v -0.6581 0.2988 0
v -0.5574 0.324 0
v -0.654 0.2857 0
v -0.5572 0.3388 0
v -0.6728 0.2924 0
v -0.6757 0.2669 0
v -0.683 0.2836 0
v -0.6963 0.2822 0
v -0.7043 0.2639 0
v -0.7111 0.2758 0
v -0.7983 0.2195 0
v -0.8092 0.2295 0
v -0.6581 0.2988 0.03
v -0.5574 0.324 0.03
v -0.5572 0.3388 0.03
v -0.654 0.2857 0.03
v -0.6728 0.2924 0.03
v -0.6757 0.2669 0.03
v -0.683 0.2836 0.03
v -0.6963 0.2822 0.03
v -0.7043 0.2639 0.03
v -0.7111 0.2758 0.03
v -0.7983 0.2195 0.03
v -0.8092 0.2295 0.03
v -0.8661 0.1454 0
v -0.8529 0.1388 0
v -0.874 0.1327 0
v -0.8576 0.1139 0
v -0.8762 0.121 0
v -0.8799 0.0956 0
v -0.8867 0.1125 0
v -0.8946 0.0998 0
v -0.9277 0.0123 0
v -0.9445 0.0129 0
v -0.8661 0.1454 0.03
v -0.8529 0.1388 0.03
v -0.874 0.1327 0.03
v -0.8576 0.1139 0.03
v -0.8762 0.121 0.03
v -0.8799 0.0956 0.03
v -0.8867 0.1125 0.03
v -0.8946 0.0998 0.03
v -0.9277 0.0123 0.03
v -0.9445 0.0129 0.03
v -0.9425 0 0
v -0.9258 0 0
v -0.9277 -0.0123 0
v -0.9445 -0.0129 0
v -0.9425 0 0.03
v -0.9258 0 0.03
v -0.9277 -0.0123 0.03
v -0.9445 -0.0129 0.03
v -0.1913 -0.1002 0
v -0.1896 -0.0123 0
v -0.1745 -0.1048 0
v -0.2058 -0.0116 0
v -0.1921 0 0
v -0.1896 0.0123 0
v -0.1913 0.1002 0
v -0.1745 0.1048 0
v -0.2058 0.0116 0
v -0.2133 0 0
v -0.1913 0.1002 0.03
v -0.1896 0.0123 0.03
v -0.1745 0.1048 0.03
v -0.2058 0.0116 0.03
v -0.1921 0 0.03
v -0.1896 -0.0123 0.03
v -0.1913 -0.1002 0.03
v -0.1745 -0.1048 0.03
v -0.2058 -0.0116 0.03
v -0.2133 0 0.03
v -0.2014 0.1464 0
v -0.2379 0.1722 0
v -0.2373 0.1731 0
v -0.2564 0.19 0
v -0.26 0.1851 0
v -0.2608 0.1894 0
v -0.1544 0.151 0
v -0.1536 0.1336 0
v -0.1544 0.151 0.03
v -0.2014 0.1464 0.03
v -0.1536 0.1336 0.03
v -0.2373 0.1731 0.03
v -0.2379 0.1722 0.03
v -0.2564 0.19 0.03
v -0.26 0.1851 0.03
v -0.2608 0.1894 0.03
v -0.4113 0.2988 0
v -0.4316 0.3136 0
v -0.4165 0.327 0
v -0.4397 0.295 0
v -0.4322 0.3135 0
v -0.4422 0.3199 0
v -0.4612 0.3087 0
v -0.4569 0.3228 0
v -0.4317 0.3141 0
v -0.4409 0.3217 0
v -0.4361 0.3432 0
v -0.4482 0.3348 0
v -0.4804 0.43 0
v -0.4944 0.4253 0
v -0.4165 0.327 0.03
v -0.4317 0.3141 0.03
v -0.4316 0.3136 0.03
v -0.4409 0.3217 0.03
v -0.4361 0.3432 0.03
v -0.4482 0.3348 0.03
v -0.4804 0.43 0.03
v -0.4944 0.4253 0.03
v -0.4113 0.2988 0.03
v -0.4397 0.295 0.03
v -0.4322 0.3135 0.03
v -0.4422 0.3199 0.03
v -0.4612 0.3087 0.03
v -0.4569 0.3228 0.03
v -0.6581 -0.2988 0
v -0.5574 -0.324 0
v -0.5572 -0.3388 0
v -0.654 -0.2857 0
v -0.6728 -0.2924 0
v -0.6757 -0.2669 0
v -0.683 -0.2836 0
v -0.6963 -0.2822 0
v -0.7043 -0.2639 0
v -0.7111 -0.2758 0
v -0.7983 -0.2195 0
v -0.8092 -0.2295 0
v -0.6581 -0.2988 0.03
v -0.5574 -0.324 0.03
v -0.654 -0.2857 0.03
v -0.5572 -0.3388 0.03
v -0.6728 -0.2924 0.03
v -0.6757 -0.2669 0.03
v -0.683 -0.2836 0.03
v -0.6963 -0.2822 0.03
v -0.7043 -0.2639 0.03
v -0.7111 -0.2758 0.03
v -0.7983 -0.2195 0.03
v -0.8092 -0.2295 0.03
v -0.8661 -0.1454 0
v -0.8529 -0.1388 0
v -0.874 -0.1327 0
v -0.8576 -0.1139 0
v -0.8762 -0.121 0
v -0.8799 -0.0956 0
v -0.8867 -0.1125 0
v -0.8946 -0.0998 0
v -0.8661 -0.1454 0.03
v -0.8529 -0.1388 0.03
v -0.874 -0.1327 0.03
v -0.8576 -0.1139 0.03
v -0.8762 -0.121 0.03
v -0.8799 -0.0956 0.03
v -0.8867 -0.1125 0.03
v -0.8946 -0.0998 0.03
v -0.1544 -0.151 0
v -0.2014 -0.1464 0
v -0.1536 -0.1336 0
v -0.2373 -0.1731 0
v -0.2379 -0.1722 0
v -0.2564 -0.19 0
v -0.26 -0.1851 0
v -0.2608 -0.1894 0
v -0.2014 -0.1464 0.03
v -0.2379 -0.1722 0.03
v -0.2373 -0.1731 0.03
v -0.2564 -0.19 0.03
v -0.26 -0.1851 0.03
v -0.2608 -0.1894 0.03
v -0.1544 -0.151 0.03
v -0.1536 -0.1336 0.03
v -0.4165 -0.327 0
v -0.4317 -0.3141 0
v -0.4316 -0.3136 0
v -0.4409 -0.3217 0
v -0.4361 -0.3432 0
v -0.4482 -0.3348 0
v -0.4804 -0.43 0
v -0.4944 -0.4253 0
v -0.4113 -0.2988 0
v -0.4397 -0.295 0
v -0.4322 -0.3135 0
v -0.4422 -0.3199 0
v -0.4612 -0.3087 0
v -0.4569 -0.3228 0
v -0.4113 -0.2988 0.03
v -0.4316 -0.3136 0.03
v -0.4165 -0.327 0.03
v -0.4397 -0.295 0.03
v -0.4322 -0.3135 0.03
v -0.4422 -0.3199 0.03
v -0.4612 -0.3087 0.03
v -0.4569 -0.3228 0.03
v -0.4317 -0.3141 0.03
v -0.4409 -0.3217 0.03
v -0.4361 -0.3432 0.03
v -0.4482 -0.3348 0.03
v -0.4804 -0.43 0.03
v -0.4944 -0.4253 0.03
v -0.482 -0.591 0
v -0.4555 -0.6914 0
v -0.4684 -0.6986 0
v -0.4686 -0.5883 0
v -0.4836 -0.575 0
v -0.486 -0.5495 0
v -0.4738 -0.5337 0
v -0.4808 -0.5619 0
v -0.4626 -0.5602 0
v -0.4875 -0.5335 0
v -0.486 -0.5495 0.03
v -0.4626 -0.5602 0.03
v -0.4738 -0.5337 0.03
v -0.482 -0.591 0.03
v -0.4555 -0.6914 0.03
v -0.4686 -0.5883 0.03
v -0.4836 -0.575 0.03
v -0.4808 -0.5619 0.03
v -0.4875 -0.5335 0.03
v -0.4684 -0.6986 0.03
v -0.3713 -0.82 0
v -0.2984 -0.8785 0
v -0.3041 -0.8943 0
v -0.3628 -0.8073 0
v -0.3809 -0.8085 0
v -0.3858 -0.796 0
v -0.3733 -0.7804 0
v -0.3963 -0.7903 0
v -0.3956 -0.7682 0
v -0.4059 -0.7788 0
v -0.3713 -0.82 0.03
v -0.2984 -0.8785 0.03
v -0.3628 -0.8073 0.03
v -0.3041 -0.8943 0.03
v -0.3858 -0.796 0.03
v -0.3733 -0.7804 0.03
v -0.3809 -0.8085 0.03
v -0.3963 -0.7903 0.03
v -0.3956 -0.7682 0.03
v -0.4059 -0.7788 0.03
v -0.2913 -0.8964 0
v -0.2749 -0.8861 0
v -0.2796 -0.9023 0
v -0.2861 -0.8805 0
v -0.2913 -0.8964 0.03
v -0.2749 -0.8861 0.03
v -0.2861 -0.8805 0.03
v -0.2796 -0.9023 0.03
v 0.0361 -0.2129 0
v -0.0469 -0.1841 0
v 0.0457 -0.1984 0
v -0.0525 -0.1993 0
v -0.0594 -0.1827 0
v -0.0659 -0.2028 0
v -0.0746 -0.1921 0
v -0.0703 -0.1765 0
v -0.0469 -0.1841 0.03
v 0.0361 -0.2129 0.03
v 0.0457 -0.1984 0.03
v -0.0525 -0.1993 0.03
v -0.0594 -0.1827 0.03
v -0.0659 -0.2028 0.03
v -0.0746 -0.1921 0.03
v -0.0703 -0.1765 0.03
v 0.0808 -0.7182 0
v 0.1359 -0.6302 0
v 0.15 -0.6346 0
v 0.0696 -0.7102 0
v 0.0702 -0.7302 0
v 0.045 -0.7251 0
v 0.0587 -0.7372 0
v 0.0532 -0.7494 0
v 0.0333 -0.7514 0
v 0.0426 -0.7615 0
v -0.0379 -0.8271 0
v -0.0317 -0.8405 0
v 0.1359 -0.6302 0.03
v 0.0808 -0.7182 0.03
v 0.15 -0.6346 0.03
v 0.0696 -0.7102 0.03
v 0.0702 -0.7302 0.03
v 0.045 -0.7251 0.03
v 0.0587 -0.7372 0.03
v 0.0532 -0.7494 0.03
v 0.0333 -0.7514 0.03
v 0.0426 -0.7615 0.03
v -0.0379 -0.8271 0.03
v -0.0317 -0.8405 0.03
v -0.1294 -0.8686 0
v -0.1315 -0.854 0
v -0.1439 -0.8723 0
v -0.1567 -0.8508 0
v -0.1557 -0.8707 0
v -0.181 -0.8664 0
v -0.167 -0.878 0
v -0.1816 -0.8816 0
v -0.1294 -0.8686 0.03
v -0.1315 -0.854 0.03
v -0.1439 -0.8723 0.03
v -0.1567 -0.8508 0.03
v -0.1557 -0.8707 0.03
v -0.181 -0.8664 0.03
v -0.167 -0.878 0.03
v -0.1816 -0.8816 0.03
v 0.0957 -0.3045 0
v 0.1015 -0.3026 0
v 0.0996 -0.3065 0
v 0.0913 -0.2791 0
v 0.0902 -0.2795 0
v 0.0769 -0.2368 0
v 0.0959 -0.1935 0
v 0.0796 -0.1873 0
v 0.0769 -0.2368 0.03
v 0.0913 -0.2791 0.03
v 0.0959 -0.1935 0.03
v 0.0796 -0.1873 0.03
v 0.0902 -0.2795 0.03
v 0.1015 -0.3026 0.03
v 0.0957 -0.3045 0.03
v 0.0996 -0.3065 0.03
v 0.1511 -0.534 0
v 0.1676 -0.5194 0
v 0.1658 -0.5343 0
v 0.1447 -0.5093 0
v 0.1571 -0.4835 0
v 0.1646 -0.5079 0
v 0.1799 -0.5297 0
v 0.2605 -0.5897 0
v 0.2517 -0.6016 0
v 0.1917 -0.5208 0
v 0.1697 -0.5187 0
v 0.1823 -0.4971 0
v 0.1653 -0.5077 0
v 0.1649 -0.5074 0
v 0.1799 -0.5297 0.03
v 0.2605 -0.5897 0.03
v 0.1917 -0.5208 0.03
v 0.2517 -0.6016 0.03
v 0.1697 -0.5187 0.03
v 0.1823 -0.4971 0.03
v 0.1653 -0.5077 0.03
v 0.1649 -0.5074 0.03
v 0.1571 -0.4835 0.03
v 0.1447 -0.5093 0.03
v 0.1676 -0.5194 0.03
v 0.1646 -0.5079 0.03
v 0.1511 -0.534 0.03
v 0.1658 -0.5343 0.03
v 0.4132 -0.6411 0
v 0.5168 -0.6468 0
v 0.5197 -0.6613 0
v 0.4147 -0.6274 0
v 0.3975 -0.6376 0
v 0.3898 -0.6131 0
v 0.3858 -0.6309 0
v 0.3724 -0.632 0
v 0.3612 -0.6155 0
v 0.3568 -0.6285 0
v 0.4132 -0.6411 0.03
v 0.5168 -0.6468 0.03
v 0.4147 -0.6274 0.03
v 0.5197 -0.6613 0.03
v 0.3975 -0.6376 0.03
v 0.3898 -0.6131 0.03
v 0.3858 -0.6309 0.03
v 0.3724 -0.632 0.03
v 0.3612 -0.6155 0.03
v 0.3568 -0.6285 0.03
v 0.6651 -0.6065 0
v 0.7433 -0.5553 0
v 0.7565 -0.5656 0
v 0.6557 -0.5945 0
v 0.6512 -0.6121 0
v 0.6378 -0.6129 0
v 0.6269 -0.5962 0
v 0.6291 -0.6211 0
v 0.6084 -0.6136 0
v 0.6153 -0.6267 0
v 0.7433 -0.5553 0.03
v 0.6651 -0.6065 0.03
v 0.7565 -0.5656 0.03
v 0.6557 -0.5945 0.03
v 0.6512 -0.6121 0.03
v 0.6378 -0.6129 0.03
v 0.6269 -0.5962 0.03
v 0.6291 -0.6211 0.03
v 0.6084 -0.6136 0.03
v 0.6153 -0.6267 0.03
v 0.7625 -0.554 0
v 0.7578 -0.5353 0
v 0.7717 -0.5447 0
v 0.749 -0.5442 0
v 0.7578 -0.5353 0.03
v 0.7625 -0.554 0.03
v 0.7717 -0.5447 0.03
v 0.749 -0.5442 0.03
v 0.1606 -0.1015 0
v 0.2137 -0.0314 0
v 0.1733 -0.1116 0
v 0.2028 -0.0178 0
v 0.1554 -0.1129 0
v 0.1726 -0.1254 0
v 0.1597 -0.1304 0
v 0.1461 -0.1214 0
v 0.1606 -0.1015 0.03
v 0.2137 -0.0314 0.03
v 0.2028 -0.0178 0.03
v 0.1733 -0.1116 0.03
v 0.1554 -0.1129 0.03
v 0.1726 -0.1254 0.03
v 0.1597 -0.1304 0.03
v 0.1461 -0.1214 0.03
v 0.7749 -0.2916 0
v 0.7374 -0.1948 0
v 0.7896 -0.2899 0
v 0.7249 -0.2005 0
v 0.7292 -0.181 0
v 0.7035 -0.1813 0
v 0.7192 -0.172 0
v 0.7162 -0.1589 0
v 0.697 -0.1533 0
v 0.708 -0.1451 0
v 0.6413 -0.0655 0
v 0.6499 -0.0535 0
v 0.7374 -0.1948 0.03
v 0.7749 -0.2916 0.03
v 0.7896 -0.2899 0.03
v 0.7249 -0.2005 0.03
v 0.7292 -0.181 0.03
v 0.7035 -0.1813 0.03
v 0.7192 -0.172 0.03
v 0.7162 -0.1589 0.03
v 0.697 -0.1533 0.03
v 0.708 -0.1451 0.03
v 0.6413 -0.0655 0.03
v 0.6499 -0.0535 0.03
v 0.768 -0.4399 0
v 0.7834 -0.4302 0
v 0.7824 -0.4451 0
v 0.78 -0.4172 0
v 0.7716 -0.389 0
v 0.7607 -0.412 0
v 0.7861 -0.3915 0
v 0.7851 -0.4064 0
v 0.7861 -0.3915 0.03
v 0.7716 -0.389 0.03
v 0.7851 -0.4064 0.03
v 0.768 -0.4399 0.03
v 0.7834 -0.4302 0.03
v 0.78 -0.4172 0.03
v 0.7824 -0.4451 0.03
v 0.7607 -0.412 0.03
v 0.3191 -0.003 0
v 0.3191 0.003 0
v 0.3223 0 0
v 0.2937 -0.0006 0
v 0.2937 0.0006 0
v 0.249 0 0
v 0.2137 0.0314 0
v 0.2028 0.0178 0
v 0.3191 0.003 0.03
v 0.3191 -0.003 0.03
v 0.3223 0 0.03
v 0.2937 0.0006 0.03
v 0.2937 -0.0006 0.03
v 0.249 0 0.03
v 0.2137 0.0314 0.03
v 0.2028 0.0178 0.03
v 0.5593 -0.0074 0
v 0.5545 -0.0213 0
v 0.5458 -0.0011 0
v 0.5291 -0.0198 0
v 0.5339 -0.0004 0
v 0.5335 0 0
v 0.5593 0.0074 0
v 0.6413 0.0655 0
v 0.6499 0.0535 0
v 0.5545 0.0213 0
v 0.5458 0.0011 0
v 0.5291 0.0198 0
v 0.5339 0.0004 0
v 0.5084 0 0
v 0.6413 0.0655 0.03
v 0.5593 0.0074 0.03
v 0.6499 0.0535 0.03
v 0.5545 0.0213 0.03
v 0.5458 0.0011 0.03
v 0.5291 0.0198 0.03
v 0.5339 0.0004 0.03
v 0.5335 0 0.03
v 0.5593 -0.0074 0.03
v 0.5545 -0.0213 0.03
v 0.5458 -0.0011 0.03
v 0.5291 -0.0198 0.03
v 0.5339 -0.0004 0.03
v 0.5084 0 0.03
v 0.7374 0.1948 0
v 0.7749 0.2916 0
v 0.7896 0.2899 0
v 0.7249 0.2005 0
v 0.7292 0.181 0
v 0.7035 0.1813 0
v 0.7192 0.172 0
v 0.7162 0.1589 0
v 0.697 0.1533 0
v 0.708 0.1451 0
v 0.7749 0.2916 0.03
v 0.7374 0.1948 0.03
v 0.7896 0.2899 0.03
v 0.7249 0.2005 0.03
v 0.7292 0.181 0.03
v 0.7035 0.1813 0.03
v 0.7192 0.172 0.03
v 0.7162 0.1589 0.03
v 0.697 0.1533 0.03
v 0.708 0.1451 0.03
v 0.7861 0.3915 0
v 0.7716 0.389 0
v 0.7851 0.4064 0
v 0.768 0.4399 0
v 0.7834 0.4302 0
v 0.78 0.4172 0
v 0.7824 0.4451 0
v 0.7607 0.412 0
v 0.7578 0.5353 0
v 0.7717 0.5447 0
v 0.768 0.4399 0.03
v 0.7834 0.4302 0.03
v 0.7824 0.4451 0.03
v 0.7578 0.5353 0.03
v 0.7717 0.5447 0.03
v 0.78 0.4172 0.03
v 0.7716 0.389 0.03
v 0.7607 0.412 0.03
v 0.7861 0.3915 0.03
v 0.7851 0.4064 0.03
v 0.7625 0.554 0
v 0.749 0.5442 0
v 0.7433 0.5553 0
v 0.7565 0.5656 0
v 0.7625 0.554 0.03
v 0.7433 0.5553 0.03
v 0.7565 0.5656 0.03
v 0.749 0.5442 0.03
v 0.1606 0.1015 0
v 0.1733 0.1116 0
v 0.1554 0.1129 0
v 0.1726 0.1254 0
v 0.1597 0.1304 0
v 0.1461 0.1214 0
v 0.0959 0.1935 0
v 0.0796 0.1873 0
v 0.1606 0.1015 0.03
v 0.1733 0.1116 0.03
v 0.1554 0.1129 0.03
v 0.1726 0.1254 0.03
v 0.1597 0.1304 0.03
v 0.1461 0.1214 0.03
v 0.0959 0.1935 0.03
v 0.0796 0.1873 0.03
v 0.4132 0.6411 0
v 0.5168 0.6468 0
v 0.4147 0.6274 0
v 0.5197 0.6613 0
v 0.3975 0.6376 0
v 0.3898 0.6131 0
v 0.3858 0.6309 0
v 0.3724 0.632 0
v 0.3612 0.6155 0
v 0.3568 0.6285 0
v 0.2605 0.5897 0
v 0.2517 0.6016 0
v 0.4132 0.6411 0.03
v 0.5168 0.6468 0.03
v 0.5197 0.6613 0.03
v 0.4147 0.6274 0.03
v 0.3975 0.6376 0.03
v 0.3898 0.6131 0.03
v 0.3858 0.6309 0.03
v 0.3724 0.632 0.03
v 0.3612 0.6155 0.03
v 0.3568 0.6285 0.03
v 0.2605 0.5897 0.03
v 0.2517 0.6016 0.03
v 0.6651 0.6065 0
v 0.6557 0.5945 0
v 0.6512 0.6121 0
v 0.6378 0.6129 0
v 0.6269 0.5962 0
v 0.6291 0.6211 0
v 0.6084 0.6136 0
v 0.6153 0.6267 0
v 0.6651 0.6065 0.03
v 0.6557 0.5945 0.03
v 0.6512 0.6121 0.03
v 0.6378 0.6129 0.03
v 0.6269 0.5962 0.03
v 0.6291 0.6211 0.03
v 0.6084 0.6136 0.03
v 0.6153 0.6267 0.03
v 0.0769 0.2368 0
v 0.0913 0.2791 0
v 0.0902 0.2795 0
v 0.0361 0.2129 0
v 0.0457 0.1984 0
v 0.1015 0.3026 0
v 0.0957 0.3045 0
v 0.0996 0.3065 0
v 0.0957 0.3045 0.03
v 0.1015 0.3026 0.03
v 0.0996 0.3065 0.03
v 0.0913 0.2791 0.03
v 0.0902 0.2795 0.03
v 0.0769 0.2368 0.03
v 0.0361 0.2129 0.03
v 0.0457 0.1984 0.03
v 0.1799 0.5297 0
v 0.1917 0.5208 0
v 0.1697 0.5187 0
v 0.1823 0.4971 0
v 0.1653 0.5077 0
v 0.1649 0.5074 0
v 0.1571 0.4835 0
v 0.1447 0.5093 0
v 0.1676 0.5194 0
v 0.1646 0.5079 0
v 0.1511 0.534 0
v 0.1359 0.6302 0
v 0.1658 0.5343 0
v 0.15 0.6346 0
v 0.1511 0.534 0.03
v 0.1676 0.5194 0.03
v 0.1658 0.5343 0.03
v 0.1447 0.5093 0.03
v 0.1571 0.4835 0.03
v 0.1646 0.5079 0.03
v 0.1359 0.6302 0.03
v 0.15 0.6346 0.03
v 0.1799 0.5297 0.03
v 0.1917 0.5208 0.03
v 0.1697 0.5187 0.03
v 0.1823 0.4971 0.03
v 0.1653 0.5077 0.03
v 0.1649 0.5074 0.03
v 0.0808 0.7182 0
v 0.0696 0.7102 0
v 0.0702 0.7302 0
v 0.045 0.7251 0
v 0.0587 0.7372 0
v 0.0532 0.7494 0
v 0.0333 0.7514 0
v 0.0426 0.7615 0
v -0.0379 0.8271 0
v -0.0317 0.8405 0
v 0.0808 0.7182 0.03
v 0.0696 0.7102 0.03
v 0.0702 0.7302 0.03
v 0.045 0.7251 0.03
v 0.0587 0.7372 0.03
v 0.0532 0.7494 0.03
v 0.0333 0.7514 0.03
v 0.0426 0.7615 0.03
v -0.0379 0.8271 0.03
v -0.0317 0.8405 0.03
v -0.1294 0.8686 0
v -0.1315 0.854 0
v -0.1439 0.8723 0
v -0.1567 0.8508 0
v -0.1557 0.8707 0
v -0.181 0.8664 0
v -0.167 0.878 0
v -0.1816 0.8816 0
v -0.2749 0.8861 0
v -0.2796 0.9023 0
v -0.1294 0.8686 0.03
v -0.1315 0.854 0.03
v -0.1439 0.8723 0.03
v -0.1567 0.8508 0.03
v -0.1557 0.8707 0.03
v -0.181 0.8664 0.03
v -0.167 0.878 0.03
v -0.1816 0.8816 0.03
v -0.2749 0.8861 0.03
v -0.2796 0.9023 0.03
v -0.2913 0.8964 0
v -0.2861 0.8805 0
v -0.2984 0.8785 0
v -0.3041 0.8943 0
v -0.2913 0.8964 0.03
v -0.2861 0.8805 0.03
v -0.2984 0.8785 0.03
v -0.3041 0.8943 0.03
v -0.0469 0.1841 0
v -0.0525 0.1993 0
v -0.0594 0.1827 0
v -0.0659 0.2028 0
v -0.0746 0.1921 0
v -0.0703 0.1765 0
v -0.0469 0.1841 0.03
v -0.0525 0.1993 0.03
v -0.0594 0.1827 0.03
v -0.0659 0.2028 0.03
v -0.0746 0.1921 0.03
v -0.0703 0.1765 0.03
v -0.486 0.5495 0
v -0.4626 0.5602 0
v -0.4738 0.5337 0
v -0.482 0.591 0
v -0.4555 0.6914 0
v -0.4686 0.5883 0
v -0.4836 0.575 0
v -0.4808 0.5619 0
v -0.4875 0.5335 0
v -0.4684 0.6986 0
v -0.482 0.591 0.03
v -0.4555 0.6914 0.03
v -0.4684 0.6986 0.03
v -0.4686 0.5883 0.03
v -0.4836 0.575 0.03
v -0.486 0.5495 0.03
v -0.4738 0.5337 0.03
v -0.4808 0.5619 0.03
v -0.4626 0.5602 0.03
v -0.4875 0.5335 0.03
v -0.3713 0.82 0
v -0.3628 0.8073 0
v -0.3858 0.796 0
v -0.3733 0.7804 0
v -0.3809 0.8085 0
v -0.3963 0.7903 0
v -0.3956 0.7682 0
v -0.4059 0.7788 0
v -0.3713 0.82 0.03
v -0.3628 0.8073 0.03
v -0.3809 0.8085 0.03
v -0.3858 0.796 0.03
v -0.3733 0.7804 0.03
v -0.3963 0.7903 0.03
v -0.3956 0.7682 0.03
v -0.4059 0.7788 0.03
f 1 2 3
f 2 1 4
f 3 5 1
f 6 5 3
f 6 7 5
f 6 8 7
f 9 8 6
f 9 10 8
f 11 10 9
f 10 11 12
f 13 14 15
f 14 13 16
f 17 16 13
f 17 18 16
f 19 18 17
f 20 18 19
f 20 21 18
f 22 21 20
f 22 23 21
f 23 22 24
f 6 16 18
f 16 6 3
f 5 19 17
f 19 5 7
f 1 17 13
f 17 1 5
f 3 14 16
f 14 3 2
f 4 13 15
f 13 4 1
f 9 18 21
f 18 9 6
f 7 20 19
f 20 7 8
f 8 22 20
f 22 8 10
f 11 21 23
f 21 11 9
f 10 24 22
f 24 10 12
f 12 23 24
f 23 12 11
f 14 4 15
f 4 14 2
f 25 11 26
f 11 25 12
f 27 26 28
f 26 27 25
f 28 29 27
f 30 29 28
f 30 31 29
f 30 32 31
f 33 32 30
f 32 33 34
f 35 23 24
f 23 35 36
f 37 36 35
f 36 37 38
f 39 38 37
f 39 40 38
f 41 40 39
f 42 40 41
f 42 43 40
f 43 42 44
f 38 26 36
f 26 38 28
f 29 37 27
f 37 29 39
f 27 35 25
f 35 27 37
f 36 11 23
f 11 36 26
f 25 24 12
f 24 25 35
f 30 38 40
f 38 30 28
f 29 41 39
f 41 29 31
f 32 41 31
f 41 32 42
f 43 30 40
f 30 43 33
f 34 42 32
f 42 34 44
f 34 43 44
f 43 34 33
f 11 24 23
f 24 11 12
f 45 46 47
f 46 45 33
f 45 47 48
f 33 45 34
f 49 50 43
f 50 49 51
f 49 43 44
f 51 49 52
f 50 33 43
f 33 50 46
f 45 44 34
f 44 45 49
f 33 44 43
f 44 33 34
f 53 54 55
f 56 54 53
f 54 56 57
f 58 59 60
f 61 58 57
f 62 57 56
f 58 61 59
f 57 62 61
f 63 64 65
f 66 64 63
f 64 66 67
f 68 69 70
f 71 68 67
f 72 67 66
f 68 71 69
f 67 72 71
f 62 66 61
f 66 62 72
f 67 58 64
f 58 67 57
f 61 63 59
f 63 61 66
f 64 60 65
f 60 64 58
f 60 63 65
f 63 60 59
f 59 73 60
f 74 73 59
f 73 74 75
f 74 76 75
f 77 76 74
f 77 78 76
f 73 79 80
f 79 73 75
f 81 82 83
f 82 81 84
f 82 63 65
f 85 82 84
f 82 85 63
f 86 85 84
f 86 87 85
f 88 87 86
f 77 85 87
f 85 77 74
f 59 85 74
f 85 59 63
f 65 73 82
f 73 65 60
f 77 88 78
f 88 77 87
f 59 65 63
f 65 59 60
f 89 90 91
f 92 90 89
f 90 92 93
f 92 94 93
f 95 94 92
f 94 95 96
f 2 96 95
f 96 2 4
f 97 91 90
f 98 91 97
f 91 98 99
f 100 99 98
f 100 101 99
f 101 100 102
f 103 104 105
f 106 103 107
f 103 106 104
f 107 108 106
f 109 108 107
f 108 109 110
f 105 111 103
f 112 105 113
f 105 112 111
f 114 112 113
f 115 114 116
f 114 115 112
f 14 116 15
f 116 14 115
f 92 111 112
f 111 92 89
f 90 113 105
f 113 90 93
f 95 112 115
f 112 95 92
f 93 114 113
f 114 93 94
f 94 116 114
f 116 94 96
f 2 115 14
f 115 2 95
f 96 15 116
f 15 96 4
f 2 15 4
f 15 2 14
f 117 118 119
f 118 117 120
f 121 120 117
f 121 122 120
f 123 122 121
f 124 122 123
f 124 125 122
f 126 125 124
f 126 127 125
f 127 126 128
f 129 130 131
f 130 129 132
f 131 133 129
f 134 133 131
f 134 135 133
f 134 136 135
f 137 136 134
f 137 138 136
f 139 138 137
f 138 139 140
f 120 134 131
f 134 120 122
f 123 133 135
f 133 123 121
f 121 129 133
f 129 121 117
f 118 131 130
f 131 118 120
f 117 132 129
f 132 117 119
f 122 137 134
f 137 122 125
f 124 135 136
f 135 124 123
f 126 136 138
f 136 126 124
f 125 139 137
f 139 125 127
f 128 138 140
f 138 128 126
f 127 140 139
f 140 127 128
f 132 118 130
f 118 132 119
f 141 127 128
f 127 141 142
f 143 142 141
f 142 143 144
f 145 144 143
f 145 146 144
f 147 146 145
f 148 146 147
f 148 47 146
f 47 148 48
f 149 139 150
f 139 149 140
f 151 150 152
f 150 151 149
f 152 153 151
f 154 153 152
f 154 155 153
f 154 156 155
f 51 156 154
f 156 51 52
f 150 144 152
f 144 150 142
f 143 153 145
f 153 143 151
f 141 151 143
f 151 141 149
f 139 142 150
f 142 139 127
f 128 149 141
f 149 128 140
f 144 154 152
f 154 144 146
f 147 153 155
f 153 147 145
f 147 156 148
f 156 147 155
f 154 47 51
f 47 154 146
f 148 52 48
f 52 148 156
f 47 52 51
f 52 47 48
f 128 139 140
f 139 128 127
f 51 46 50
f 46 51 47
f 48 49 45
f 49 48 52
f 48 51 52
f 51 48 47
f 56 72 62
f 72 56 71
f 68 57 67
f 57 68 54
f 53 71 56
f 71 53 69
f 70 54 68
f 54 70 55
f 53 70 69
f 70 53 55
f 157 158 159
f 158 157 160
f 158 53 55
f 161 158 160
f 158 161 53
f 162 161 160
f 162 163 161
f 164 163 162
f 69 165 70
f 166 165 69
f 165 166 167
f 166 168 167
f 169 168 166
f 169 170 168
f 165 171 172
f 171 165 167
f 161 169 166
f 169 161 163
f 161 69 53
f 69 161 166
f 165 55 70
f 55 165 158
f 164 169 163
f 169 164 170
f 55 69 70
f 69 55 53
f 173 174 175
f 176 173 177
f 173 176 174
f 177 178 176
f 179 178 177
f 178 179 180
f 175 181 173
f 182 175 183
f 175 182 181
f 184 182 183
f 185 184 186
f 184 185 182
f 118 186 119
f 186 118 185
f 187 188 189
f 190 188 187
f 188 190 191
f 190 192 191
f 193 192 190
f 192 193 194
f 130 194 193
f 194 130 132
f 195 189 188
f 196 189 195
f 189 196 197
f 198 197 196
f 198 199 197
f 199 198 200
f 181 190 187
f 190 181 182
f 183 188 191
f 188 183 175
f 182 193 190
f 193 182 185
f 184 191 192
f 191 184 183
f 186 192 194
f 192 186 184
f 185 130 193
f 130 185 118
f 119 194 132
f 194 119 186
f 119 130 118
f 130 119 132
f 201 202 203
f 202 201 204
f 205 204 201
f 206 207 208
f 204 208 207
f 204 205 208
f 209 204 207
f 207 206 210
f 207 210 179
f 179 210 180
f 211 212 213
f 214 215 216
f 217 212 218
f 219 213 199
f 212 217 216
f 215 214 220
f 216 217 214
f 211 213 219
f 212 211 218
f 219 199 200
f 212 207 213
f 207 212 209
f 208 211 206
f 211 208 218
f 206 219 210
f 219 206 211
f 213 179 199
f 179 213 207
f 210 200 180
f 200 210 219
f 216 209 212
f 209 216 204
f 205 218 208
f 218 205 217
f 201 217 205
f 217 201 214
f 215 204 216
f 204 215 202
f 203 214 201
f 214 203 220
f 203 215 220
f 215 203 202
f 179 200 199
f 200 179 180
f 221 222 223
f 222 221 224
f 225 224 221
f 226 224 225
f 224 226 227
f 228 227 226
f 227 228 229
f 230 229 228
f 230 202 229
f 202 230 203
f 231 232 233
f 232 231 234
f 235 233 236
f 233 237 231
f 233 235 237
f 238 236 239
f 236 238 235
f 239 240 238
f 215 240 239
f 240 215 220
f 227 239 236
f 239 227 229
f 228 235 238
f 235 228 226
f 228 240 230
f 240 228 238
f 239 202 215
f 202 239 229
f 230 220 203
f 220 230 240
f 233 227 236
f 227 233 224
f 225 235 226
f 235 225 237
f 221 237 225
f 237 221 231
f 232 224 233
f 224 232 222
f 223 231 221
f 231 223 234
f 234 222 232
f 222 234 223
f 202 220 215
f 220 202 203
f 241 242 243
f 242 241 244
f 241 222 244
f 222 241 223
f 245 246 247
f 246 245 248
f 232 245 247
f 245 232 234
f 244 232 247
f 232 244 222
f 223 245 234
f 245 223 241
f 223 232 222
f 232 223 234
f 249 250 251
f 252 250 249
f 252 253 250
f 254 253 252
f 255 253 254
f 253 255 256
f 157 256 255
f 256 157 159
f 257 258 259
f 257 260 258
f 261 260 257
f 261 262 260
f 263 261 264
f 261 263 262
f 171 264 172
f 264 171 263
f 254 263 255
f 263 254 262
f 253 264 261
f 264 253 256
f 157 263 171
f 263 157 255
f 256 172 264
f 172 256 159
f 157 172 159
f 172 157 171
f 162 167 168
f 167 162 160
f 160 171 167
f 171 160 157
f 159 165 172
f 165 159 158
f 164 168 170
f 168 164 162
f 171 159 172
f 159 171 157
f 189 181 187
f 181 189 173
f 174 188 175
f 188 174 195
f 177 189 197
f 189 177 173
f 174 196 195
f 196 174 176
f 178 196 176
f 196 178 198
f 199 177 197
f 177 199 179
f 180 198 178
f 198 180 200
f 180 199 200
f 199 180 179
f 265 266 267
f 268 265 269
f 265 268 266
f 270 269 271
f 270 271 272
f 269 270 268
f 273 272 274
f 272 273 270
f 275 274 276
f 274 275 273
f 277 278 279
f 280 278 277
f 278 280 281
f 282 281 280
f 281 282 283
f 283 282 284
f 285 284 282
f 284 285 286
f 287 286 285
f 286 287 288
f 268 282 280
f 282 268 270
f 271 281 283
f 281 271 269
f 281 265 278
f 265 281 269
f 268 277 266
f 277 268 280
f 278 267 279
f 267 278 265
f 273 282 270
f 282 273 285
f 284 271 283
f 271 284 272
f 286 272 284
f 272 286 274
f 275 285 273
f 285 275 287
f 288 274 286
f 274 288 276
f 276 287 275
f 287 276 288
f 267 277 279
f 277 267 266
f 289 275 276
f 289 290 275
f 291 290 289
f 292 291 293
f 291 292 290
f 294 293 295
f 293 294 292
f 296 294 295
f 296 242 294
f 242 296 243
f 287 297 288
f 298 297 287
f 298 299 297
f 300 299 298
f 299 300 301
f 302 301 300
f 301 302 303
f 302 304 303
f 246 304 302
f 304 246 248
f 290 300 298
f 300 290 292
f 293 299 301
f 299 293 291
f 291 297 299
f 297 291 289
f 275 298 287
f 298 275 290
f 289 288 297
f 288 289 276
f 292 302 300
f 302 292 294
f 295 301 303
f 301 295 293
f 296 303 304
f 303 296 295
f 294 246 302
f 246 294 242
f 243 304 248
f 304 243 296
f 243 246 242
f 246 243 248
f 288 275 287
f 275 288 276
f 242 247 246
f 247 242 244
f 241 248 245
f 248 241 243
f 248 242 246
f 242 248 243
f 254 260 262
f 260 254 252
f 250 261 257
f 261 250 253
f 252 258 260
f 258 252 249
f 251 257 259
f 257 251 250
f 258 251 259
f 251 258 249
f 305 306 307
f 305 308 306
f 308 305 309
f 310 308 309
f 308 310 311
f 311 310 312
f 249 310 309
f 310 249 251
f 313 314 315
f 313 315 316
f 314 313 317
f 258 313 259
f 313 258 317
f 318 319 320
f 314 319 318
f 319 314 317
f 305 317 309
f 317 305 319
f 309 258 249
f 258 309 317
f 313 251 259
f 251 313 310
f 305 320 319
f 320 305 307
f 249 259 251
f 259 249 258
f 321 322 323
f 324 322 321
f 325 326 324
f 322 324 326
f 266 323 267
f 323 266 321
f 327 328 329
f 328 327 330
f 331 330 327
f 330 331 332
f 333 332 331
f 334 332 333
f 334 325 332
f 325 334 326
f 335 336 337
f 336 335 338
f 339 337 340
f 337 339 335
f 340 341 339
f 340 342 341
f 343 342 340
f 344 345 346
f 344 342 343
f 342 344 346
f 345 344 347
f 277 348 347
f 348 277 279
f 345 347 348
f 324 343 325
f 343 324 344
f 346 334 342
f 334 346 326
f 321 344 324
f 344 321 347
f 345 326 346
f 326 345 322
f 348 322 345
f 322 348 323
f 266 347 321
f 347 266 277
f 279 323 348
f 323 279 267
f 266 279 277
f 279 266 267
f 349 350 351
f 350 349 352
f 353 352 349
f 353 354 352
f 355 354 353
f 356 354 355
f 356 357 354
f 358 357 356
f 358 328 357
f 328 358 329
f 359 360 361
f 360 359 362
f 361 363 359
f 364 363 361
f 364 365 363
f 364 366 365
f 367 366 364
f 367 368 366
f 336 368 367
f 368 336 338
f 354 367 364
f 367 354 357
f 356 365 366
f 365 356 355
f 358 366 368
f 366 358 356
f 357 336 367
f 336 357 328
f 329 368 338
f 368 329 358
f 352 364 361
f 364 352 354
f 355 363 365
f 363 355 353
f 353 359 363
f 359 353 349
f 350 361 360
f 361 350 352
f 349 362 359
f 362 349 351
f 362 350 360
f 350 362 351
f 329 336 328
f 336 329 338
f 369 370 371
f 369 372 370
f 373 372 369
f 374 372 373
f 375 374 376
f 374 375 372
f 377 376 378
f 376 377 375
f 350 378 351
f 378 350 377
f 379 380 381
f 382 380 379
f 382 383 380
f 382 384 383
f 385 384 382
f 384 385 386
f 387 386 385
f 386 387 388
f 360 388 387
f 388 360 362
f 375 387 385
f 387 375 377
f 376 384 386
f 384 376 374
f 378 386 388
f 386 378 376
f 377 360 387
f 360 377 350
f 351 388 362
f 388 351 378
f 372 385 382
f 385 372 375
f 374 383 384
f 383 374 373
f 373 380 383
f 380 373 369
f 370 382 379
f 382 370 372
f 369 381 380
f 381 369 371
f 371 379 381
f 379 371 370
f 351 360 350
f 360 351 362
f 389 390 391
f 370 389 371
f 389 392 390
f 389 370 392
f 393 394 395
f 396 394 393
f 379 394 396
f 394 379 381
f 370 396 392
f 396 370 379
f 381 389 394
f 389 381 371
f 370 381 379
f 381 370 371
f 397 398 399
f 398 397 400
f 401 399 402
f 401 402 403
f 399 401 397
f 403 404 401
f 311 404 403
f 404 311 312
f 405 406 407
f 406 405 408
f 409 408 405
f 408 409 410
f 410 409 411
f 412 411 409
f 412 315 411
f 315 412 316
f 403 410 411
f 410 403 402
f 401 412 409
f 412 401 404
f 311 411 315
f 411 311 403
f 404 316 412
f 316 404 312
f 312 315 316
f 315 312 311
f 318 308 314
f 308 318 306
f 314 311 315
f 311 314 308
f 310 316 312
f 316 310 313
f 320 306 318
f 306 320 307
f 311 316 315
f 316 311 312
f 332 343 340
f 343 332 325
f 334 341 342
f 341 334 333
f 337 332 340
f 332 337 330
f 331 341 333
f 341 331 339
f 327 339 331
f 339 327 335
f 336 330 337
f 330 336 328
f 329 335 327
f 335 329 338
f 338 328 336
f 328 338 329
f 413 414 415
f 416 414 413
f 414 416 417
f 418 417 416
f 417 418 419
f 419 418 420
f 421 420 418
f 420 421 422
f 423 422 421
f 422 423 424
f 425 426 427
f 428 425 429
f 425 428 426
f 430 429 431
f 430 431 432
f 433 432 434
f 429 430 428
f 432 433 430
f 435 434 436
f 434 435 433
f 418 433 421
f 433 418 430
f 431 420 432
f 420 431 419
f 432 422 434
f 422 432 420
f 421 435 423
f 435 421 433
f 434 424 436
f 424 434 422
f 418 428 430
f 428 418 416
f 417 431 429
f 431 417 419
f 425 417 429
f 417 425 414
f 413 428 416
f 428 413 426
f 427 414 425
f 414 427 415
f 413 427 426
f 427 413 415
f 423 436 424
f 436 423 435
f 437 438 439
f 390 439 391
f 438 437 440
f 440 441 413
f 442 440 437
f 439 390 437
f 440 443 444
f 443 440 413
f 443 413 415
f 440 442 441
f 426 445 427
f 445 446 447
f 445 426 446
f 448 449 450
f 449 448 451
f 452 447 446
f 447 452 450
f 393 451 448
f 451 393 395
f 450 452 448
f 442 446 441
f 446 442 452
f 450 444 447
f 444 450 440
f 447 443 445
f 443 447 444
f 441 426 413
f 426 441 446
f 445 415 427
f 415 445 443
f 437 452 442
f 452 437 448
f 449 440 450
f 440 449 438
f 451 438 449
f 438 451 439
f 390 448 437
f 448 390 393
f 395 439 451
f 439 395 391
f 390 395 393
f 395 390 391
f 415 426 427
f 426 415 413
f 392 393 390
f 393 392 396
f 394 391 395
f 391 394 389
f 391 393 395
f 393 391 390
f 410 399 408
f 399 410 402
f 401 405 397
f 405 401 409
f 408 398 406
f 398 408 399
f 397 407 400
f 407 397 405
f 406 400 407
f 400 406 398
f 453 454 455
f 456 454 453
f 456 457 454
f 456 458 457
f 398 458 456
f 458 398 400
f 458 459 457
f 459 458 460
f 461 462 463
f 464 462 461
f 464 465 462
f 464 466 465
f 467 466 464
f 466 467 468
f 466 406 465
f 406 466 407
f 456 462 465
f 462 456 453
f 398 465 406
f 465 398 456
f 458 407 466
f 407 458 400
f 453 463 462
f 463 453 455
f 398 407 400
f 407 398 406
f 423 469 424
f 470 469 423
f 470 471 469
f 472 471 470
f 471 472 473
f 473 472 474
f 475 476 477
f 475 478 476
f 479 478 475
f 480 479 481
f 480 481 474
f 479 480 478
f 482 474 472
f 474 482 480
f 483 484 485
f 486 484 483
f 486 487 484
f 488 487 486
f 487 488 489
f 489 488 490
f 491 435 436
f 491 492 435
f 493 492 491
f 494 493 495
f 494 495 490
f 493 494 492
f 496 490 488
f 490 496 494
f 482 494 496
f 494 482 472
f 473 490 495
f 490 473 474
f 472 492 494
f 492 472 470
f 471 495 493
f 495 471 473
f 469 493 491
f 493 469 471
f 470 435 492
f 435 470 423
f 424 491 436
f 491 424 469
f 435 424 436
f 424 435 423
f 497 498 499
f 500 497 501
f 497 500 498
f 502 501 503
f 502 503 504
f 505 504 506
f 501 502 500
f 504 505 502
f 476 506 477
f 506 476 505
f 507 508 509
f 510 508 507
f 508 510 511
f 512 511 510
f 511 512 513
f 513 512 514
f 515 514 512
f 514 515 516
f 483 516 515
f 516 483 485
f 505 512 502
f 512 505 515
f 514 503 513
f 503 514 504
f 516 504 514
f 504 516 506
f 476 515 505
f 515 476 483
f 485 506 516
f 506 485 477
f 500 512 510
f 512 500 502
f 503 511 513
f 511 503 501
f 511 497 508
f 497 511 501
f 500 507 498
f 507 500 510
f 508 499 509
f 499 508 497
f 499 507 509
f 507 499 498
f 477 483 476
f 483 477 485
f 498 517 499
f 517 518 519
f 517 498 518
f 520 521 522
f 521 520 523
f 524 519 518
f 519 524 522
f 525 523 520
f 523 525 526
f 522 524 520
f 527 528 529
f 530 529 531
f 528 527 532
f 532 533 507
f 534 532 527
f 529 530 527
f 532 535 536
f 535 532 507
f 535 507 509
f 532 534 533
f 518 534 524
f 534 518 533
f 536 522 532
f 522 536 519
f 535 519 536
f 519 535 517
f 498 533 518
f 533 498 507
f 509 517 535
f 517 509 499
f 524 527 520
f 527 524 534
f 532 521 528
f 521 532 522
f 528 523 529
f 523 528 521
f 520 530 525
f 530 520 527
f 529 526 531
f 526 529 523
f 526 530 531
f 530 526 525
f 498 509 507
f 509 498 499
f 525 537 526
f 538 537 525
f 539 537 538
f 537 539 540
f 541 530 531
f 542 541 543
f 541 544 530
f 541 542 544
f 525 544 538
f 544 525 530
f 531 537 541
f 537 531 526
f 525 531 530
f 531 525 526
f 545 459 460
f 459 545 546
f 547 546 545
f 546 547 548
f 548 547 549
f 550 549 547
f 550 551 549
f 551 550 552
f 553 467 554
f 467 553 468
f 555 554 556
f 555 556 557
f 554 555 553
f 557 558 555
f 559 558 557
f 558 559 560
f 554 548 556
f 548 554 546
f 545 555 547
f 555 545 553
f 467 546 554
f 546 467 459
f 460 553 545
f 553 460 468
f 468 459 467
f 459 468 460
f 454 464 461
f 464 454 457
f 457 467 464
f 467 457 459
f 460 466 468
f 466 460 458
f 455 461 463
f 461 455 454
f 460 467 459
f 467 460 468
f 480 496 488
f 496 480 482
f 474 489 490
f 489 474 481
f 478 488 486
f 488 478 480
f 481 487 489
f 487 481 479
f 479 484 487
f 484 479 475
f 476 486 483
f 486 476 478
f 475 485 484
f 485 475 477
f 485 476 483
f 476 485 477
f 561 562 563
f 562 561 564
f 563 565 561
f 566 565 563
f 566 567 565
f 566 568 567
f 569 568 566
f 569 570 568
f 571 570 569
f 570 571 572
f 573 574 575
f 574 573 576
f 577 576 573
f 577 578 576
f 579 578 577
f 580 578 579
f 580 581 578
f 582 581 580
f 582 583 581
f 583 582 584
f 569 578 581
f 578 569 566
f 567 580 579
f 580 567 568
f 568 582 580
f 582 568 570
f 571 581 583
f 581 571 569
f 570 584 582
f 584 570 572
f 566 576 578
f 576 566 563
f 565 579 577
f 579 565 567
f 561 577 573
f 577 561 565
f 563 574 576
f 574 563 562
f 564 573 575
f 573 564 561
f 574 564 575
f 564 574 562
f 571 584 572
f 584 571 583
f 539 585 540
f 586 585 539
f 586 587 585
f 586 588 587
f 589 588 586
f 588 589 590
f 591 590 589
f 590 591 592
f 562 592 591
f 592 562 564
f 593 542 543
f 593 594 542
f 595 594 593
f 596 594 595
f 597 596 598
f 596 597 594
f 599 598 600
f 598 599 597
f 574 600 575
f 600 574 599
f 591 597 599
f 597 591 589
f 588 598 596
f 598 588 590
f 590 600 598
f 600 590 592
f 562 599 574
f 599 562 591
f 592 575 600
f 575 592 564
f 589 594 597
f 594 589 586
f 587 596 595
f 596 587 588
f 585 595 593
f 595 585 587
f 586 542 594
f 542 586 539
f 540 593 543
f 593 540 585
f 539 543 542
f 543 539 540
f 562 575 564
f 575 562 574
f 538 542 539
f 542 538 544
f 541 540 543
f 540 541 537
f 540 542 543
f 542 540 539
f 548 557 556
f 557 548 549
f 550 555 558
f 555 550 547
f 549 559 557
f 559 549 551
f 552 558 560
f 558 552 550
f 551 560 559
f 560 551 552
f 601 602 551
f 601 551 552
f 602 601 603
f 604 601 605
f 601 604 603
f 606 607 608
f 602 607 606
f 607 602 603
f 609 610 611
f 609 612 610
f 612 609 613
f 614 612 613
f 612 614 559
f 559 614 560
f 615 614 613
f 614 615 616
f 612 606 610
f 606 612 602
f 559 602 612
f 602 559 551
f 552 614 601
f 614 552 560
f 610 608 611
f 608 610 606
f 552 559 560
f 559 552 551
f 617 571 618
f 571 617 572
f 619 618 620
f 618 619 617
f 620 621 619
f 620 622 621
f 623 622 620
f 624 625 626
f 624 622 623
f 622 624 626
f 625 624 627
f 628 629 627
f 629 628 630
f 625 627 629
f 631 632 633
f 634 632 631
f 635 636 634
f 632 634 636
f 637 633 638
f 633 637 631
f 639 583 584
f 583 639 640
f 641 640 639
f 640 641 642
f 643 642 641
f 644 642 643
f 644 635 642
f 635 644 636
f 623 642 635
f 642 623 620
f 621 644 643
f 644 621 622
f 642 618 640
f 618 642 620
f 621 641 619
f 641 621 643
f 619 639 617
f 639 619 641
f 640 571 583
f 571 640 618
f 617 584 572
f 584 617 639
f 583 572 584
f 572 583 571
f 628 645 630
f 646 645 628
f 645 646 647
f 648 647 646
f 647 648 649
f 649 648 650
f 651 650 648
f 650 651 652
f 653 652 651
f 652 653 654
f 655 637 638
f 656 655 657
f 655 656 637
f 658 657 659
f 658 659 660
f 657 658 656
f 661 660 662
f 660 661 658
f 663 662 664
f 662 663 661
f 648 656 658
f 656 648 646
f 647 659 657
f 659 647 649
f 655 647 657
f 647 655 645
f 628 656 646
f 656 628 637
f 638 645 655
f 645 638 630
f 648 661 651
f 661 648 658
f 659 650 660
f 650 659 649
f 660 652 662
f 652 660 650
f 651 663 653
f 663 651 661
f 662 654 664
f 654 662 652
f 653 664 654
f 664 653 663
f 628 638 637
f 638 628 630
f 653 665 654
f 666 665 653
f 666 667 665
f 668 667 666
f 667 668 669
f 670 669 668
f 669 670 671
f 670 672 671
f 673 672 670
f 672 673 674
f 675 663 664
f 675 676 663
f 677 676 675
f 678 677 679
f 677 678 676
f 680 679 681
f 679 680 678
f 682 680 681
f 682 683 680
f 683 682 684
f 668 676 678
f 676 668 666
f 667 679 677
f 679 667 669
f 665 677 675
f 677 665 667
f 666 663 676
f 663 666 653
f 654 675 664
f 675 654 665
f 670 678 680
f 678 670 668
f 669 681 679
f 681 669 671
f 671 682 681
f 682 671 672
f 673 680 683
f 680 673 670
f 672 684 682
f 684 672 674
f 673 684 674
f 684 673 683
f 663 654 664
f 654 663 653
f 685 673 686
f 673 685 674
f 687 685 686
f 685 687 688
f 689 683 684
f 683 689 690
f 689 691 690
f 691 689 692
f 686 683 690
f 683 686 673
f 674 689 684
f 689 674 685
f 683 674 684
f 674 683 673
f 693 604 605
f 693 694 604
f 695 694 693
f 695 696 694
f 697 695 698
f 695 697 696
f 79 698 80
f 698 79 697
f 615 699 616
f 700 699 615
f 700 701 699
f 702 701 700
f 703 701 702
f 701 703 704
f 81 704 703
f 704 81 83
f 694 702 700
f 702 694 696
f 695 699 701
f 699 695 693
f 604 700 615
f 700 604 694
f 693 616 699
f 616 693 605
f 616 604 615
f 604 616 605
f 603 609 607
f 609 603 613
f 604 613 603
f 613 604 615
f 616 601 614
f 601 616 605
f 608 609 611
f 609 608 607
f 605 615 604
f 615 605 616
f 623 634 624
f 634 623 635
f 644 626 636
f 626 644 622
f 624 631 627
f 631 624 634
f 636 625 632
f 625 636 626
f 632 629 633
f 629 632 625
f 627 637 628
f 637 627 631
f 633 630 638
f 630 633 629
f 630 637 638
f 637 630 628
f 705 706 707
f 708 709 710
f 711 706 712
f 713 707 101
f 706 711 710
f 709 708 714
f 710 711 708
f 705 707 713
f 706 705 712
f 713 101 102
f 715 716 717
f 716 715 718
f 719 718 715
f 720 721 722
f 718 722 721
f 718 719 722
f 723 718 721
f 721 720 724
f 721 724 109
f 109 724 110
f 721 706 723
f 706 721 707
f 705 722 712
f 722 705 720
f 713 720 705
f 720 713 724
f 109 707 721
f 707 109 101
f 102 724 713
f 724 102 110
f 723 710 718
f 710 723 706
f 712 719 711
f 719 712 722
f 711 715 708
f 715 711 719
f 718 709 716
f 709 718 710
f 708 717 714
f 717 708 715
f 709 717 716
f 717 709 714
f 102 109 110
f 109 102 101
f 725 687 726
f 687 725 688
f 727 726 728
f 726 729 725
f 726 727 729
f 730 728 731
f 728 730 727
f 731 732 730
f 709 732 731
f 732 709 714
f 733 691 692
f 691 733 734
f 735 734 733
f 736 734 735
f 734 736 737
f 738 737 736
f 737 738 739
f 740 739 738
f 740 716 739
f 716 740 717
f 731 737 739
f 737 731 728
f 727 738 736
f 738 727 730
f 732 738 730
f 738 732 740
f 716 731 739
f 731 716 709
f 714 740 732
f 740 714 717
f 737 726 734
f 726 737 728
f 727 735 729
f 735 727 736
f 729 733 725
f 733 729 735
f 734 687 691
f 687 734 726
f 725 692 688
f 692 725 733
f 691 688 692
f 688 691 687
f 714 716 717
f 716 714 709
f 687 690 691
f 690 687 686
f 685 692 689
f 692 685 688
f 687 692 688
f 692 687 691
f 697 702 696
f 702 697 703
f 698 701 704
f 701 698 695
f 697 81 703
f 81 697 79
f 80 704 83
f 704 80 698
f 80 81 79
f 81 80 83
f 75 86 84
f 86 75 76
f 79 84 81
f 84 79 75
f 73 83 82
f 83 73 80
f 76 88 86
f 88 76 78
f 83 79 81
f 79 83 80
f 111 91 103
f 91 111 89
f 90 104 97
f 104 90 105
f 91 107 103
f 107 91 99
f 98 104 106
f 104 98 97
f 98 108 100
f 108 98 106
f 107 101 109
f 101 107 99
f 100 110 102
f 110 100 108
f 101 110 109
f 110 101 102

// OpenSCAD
// asymmetrisk skala
// array diamant och ruta

baser=rnd(1.4,2);
phase=rnd(360);

mag1=rnd(6)*baser;
rep1=round(rnd(0,8));
ophase1=rnd(360);

mag2=rnd(6)*baser;
rep2=round(rnd(3,10));
ophase2=rnd(360);

phase0=rnd(360);
r0=rnd(0,1);
phase1=rnd(360);
r1=rnd(0,1)/2;
phase2=rnd(360);
r2=rnd(0,1)/3;
phase3=rnd(360);
r3=rnd(0,1)/4;
phase8=rnd(360);
r8=rnd(0,1)/8;
rsym1=round(rnd(1,6));
rsym2=round(rnd(0,rnd(16)));
msym1=round(rnd(0,rsym1));
msym2=round(rnd(0,rsym2));
rsum=baser+r0+r1+r2+r3+r8;
step=5*rsym1;
d=rnd(360);
e=rnd(-0.1,0.1);
 symmetries(rsym1,msym1){translate([-0.7+0.7/rsym1,0,0])rotate([0,0,d])scale([0.3+0.7/rsym1,e+0.3+0.7/rsym1,1])symmetries(rsym2,msym2){it ();};}
//symmetries(rsym2,msym2){it ();}
module symmetries(rsym,msym){
for(j=[0:360/rsym:360])rotate([0,0,j]){
intersection(){
if(msym==0) children ();else union(){
    intersection(){
    children ();
    translate([-1,0,-0.05])scale([2,1,0.2])cube(1);
    }
    mirror([0,1,0]) intersection(){
    children ();
    translate([-1,0,-0.05])scale([2,1,0.2])cube(1);
    }}

if(rsym>1){intersection(){
rotate ([0,0,(360/rsym)*0.5])translate([-1,0,-0.05])scale([2,1,0.2])cube(1);
mirror([0,1,0])rotate ([0,0,(360/rsym)*0.5])translate([-1,0,-0.05])scale([2,1,0.2])cube(1);
}}else {scale([1,1,0.2])cube(2,center=true);
}
}}}

module it(){
cube(0.03,$fn=10);
for(i=[0:step:360]){hull(){
theta = i+ sin((i+ophase1)*rep1)*mag1+ sin((i+ophase2)*rep2)*mag2;
translate([
sin(theta+phase)*(baser+sin((i+phase0))*r0 +sin((i+phase1)*2)*r1+sin((i+phase2)*3)*r2+sin((i+phase3)*4)*r3+sin((i+phase8)*8)*r8)/rsum
,
cos(theta+phase)*(baser+sin((i+phase0))*r0+sin((i+phase1)*2)*r1+sin((i+phase2)*3)*r2+sin((i+phase3)*4)*r3+sin((i+phase8)*8)*r8)/rsum
,0

])cube(0.03,$fn=10);
ii=(i+step)%360;
theta2 = ii+ sin((ii+ophase1)*rep1)*mag1+ sin((ii+ophase2)*rep2)*mag2;
translate([
sin(theta2+phase)*(baser+sin((ii+phase0))*r0 +sin((ii+phase1)*2)*r1+sin((ii+phase2)*3)*r2+sin((ii+phase3)*4)*r3+sin((ii+phase8)*8)*r8)/rsum
,
cos(theta2+phase)*(baser+sin((ii+phase0))*r0+sin((ii+phase1)*2)*r1+sin((ii+phase2)*3)*r2+sin((ii+phase3)*4)*r3+sin((ii+phase8)*8)*r8)/rsum
,0

])cube(0.03,$fn=10);
}}}


function rndR()=[rands(0,360,1)[0],rands(0,360,1)[1],rands(0,360,1)[0]];

function un(v)=v/max(len3(v),0.000001)*1;
function p2n(pa,pb,pc)=
let(u=pa-pb,v=pa-pc)un([u[1]*v[2]-u[2]*v[1],u[2]*v[0]-u[0]*v[2],u[0]*v[1]-u[1]*v[0]]);
function avrg(v)=sumv(v,max(0,len(v)-1))/len(v);
function lerp(start,end,bias)=(end*bias+start*(1-bias));
function len3(v)=len(v)==2?sqrt(pow(v[0],2)+pow(v[1],2)):sqrt(pow(v[0],2)+pow(v[1],2)+pow(v[2],2));
function sumv(v,i,s=0)=(i==s?v[i]:v[i]+sumv(v,i-1,s));
function rnd(a=0,b=1)=(rands(min(a,b),max(a,b),1)[0]);
function rndc()=[rands(0,1,1)[0],rands(0,1,1)[0],rands(0,1,1)[0]];
